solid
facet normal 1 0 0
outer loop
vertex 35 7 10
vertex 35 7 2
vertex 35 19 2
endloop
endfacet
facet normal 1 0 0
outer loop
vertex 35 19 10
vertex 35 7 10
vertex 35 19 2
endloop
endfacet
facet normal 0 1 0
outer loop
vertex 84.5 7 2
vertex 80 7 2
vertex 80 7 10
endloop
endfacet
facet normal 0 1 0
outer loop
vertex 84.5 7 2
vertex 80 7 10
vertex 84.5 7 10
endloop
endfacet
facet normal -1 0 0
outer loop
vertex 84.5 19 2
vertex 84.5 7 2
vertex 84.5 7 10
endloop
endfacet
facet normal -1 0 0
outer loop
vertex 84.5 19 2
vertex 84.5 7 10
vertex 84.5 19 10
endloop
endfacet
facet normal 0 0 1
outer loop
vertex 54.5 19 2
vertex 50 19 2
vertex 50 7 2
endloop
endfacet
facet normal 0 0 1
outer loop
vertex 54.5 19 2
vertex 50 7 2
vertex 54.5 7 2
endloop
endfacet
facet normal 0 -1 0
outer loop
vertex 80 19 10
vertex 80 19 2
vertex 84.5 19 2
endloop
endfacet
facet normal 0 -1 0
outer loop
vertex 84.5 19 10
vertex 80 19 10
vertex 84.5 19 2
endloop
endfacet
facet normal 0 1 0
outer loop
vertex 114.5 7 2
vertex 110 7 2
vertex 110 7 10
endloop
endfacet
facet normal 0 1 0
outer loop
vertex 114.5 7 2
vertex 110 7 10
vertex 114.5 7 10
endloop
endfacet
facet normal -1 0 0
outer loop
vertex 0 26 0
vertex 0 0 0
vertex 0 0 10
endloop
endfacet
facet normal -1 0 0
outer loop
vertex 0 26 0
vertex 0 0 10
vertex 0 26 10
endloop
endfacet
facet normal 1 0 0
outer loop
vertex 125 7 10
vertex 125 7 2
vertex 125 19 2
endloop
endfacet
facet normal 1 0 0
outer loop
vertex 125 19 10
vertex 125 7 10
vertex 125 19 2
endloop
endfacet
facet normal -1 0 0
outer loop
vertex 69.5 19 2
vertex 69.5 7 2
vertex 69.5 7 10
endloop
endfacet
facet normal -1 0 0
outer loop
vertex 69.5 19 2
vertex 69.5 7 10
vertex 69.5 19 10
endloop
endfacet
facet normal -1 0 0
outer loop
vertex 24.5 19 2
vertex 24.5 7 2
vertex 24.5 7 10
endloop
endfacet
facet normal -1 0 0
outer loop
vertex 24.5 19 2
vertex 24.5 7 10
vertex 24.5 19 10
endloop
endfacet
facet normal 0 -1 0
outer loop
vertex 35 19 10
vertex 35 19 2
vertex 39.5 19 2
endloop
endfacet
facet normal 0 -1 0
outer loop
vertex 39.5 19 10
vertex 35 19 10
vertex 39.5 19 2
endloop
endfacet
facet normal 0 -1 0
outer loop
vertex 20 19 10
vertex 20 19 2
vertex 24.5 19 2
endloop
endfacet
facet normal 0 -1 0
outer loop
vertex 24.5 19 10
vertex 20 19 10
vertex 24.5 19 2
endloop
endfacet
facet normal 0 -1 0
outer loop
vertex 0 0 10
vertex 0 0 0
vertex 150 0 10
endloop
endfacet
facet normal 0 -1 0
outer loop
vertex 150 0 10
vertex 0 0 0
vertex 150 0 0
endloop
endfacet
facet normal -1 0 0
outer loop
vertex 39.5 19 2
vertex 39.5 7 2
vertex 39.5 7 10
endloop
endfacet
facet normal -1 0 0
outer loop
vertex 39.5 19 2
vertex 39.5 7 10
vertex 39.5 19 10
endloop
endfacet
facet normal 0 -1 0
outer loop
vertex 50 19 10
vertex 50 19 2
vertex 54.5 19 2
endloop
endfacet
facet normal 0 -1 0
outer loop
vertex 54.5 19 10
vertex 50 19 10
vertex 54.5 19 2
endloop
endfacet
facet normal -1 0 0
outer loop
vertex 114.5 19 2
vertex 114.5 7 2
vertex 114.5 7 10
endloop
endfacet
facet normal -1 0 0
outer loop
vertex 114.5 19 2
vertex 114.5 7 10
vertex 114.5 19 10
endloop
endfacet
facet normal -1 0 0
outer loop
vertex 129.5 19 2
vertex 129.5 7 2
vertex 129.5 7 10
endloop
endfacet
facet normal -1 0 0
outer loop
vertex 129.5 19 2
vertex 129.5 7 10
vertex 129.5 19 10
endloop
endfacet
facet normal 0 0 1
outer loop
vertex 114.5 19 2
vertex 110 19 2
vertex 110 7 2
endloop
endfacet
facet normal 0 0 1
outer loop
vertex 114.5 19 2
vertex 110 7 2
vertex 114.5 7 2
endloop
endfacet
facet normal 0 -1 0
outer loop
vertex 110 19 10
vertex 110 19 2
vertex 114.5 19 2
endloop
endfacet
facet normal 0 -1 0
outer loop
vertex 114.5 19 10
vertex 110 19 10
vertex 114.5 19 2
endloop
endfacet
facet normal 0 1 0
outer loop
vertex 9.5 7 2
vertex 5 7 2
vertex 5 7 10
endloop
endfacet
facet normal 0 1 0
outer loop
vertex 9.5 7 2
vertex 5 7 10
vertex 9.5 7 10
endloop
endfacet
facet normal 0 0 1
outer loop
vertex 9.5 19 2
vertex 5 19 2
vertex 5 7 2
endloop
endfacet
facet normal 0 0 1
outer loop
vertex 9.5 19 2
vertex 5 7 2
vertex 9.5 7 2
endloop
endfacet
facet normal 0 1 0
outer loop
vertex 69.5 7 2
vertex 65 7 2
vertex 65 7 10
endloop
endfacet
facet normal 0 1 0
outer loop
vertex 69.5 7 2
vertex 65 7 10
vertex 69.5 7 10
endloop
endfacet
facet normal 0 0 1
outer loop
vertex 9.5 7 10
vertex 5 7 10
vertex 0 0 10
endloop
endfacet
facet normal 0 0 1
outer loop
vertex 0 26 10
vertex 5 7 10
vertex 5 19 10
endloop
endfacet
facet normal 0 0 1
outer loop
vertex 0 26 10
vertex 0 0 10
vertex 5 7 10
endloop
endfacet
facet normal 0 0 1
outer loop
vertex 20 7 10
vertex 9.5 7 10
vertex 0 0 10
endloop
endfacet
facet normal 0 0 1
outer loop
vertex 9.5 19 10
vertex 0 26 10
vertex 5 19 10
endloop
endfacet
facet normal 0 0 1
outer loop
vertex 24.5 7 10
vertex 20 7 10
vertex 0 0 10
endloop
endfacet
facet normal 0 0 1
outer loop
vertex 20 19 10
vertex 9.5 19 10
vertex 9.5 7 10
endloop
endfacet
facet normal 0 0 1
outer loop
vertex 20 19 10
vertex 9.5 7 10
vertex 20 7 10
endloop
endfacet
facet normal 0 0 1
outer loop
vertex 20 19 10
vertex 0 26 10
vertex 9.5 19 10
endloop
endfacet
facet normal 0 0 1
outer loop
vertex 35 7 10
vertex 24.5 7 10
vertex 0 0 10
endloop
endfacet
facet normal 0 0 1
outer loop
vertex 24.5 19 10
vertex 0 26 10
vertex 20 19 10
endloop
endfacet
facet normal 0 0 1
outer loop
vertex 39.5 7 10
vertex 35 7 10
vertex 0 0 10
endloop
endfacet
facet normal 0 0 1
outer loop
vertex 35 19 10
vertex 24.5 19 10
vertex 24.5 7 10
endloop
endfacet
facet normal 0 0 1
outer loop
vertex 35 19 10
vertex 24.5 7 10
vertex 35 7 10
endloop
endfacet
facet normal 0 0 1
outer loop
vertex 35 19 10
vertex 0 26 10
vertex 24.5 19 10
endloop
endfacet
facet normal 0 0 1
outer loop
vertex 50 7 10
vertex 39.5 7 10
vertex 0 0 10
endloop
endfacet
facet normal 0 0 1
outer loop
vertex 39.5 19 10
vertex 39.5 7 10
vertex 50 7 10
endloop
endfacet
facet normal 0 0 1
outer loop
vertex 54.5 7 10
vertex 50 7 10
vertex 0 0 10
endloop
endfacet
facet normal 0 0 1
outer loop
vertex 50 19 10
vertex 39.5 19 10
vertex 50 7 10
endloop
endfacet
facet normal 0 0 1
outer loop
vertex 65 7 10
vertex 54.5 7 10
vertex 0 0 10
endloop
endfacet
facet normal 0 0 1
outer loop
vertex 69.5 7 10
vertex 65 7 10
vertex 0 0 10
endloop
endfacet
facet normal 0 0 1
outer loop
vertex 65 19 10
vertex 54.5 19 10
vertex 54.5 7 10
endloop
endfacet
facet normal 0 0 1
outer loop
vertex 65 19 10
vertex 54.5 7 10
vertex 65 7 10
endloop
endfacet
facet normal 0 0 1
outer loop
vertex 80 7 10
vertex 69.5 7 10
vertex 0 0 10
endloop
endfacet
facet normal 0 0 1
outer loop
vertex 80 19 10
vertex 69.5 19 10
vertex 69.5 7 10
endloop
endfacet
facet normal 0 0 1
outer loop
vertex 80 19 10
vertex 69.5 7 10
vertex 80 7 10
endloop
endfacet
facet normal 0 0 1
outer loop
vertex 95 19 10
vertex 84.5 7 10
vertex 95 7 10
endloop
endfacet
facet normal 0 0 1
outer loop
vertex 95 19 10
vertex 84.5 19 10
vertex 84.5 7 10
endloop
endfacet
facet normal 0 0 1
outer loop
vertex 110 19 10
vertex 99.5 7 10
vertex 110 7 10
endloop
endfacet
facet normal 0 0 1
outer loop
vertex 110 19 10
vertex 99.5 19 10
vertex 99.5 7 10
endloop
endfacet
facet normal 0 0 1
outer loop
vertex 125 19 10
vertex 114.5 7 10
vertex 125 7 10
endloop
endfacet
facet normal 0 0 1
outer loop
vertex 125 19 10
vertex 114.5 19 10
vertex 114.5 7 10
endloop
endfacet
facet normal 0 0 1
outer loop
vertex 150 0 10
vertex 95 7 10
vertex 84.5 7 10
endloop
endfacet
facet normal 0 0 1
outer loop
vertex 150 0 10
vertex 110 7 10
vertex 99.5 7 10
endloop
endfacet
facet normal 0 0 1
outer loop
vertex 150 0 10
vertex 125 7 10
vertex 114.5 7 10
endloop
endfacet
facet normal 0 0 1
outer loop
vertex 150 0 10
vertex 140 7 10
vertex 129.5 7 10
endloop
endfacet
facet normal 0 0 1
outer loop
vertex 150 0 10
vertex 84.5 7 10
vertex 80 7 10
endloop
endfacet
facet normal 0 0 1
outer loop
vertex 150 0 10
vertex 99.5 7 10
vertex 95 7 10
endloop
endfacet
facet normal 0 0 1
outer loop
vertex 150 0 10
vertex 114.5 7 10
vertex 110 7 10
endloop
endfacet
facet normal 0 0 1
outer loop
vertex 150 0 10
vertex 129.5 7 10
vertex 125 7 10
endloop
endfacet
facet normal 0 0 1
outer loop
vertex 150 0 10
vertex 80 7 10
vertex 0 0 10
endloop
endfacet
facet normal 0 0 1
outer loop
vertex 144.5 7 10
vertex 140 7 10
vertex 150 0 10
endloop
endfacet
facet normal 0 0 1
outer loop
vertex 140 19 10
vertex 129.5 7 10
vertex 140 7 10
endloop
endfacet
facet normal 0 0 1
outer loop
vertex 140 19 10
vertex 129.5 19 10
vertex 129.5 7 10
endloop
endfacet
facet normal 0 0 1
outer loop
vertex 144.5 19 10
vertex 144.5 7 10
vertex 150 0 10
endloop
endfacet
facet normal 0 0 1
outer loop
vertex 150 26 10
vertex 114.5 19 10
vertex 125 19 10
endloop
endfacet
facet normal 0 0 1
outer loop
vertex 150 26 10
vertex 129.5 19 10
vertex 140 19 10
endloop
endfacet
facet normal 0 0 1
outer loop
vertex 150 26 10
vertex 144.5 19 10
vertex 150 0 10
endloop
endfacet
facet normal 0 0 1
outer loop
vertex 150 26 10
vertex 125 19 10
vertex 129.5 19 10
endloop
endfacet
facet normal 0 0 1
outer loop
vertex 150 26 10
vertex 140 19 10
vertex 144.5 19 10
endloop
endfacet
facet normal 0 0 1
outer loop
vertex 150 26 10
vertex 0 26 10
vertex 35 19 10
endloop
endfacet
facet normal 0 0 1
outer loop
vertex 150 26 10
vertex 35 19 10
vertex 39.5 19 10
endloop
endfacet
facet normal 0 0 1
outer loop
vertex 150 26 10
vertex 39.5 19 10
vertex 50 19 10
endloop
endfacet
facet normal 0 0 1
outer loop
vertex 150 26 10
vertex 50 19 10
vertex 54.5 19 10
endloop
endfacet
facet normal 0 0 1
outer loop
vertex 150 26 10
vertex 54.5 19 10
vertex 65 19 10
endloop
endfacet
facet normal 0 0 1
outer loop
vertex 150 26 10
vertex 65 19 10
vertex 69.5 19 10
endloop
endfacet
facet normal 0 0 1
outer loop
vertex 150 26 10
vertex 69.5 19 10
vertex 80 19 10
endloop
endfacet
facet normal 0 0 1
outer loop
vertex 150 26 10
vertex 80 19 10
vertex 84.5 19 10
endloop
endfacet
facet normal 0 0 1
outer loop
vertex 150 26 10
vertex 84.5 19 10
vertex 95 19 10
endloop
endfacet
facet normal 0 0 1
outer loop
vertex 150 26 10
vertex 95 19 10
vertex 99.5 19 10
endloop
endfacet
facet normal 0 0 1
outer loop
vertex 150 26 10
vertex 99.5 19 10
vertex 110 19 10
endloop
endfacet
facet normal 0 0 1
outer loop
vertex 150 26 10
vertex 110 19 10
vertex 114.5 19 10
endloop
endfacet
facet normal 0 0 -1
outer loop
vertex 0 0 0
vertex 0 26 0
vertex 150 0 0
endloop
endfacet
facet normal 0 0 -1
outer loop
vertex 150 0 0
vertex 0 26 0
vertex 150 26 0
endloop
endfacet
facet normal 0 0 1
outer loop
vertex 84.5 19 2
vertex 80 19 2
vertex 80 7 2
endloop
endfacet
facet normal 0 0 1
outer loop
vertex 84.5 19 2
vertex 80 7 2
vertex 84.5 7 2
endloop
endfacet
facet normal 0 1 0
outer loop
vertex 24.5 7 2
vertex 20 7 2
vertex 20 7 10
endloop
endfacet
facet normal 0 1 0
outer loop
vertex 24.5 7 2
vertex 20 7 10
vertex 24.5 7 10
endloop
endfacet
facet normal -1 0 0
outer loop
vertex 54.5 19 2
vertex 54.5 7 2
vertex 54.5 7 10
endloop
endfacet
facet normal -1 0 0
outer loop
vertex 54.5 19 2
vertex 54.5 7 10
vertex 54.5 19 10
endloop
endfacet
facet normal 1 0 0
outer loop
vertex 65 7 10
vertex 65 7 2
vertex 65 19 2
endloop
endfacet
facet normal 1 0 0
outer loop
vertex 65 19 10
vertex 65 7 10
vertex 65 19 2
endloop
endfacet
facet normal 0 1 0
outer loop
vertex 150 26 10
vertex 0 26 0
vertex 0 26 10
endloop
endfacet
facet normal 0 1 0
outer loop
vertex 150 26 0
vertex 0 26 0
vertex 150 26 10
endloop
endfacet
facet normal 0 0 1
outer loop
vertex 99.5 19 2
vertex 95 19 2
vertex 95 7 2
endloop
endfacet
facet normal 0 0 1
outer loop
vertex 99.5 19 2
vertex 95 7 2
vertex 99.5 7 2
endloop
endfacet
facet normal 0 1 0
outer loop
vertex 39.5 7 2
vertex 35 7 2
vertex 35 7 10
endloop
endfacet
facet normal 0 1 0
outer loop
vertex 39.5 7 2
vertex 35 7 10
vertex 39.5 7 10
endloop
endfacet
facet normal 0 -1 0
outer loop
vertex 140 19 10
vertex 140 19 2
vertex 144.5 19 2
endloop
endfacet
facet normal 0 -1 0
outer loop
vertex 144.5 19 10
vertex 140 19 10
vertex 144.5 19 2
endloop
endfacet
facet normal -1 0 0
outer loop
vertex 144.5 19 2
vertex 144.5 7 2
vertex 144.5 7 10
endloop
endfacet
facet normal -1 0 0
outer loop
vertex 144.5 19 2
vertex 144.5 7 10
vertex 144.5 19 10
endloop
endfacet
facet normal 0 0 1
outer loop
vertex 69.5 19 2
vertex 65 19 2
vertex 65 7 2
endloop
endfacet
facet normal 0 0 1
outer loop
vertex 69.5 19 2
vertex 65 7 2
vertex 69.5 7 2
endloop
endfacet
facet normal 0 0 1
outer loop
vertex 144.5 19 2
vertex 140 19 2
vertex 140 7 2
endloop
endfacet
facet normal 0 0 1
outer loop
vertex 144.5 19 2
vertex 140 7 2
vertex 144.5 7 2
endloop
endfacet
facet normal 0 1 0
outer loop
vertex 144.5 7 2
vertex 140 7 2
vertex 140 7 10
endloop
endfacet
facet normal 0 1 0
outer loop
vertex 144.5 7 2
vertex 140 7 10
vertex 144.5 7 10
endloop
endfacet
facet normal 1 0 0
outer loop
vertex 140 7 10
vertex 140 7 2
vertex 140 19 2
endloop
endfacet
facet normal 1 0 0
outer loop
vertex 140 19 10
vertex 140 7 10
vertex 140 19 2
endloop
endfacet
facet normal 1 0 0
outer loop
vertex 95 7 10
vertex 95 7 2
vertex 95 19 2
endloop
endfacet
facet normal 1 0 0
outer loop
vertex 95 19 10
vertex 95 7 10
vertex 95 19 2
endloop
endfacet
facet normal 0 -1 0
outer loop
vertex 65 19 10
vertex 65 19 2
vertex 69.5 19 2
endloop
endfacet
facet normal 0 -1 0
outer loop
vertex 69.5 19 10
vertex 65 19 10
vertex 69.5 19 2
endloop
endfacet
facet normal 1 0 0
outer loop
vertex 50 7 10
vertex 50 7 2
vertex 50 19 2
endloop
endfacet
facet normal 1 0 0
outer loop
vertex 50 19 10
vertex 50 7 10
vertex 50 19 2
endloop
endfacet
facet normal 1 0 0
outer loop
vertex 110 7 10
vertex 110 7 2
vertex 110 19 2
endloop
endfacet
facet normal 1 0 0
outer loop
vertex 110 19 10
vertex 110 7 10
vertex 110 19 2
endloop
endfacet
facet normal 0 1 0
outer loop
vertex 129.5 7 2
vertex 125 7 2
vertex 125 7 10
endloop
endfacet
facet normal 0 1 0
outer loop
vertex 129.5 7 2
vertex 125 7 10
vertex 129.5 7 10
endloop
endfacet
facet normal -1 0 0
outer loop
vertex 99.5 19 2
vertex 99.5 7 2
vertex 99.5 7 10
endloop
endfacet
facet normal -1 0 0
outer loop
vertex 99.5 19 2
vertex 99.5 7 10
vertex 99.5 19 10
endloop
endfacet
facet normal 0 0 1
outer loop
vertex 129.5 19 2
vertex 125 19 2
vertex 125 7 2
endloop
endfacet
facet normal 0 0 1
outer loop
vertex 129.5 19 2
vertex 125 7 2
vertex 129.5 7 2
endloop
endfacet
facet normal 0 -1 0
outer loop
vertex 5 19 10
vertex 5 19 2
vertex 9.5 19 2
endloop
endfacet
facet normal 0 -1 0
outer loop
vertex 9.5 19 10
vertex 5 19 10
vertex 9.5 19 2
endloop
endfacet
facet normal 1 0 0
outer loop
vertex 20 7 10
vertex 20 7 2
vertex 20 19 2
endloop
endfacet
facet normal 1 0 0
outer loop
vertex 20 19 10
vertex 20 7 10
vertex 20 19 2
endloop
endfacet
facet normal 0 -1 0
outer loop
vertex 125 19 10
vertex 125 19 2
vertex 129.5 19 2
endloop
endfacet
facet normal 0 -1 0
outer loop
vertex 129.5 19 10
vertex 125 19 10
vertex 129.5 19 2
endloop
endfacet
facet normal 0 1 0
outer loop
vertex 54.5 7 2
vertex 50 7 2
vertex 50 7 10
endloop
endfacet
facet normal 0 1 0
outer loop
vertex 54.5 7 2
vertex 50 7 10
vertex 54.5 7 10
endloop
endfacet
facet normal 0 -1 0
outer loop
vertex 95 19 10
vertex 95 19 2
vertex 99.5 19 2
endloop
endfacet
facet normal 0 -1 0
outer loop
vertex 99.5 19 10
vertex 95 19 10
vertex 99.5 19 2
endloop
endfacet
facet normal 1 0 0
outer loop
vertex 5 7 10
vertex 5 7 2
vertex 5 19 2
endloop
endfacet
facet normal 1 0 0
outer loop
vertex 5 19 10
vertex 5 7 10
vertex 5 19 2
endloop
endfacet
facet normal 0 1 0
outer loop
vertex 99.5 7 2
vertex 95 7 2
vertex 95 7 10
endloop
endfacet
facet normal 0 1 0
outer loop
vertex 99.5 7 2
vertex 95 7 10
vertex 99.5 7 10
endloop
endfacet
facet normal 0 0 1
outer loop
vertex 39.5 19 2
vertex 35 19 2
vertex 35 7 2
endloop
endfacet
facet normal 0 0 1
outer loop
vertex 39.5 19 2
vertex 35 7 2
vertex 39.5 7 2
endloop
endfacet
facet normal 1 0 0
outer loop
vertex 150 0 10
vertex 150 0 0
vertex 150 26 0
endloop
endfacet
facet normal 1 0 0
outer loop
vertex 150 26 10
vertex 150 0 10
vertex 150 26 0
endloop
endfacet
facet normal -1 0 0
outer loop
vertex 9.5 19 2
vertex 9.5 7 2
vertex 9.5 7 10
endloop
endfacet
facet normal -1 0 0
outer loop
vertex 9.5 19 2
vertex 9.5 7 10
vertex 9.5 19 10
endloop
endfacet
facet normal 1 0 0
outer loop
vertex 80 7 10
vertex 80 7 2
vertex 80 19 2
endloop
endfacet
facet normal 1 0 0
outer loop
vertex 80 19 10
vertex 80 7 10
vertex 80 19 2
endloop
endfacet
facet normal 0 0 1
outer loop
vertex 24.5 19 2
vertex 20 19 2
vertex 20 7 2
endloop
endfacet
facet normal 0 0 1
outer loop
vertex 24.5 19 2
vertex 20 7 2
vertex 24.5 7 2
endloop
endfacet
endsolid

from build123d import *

# Parameters (mm, degrees)
BOX001_W      = 4.5
BOX001_H      = 12
BOX001_DEPTH  = 15
ARRAY_X_COUNT = 10
ARRAY_X_PITCH = 15
BOX_W         = 150
BOX_H         = 26
BOX_DEPTH     = 10


with BuildPart() as array:
    # Box001 → Box001 (new body)
    with BuildSketch(Plane(origin=(5, 7, 2), x_dir=(1, 0, 0), z_dir=(0, 0, 1))):
        with Locations((2.25, 6)):
            Rectangle(BOX001_W, BOX001_H)
    extrude(amount=BOX001_DEPTH)

    # Array X: Array ×10


with BuildPart() as array_1:
    add(array.part)
    with Locations(*[(i * ARRAY_X_PITCH, 0, 0) for i in range(1, ARRAY_X_COUNT)]):
        add(array.part)


with BuildPart() as cut:
    # Box → Box (new body)
    with BuildSketch(Plane.XY):
        with Locations((75, 13)):
            Rectangle(BOX_W, BOX_H)
    extrude(amount=BOX_DEPTH)

    # Cut: cut Array
    add(array_1.part, mode=Mode.SUBTRACT)


solid = cut.part
